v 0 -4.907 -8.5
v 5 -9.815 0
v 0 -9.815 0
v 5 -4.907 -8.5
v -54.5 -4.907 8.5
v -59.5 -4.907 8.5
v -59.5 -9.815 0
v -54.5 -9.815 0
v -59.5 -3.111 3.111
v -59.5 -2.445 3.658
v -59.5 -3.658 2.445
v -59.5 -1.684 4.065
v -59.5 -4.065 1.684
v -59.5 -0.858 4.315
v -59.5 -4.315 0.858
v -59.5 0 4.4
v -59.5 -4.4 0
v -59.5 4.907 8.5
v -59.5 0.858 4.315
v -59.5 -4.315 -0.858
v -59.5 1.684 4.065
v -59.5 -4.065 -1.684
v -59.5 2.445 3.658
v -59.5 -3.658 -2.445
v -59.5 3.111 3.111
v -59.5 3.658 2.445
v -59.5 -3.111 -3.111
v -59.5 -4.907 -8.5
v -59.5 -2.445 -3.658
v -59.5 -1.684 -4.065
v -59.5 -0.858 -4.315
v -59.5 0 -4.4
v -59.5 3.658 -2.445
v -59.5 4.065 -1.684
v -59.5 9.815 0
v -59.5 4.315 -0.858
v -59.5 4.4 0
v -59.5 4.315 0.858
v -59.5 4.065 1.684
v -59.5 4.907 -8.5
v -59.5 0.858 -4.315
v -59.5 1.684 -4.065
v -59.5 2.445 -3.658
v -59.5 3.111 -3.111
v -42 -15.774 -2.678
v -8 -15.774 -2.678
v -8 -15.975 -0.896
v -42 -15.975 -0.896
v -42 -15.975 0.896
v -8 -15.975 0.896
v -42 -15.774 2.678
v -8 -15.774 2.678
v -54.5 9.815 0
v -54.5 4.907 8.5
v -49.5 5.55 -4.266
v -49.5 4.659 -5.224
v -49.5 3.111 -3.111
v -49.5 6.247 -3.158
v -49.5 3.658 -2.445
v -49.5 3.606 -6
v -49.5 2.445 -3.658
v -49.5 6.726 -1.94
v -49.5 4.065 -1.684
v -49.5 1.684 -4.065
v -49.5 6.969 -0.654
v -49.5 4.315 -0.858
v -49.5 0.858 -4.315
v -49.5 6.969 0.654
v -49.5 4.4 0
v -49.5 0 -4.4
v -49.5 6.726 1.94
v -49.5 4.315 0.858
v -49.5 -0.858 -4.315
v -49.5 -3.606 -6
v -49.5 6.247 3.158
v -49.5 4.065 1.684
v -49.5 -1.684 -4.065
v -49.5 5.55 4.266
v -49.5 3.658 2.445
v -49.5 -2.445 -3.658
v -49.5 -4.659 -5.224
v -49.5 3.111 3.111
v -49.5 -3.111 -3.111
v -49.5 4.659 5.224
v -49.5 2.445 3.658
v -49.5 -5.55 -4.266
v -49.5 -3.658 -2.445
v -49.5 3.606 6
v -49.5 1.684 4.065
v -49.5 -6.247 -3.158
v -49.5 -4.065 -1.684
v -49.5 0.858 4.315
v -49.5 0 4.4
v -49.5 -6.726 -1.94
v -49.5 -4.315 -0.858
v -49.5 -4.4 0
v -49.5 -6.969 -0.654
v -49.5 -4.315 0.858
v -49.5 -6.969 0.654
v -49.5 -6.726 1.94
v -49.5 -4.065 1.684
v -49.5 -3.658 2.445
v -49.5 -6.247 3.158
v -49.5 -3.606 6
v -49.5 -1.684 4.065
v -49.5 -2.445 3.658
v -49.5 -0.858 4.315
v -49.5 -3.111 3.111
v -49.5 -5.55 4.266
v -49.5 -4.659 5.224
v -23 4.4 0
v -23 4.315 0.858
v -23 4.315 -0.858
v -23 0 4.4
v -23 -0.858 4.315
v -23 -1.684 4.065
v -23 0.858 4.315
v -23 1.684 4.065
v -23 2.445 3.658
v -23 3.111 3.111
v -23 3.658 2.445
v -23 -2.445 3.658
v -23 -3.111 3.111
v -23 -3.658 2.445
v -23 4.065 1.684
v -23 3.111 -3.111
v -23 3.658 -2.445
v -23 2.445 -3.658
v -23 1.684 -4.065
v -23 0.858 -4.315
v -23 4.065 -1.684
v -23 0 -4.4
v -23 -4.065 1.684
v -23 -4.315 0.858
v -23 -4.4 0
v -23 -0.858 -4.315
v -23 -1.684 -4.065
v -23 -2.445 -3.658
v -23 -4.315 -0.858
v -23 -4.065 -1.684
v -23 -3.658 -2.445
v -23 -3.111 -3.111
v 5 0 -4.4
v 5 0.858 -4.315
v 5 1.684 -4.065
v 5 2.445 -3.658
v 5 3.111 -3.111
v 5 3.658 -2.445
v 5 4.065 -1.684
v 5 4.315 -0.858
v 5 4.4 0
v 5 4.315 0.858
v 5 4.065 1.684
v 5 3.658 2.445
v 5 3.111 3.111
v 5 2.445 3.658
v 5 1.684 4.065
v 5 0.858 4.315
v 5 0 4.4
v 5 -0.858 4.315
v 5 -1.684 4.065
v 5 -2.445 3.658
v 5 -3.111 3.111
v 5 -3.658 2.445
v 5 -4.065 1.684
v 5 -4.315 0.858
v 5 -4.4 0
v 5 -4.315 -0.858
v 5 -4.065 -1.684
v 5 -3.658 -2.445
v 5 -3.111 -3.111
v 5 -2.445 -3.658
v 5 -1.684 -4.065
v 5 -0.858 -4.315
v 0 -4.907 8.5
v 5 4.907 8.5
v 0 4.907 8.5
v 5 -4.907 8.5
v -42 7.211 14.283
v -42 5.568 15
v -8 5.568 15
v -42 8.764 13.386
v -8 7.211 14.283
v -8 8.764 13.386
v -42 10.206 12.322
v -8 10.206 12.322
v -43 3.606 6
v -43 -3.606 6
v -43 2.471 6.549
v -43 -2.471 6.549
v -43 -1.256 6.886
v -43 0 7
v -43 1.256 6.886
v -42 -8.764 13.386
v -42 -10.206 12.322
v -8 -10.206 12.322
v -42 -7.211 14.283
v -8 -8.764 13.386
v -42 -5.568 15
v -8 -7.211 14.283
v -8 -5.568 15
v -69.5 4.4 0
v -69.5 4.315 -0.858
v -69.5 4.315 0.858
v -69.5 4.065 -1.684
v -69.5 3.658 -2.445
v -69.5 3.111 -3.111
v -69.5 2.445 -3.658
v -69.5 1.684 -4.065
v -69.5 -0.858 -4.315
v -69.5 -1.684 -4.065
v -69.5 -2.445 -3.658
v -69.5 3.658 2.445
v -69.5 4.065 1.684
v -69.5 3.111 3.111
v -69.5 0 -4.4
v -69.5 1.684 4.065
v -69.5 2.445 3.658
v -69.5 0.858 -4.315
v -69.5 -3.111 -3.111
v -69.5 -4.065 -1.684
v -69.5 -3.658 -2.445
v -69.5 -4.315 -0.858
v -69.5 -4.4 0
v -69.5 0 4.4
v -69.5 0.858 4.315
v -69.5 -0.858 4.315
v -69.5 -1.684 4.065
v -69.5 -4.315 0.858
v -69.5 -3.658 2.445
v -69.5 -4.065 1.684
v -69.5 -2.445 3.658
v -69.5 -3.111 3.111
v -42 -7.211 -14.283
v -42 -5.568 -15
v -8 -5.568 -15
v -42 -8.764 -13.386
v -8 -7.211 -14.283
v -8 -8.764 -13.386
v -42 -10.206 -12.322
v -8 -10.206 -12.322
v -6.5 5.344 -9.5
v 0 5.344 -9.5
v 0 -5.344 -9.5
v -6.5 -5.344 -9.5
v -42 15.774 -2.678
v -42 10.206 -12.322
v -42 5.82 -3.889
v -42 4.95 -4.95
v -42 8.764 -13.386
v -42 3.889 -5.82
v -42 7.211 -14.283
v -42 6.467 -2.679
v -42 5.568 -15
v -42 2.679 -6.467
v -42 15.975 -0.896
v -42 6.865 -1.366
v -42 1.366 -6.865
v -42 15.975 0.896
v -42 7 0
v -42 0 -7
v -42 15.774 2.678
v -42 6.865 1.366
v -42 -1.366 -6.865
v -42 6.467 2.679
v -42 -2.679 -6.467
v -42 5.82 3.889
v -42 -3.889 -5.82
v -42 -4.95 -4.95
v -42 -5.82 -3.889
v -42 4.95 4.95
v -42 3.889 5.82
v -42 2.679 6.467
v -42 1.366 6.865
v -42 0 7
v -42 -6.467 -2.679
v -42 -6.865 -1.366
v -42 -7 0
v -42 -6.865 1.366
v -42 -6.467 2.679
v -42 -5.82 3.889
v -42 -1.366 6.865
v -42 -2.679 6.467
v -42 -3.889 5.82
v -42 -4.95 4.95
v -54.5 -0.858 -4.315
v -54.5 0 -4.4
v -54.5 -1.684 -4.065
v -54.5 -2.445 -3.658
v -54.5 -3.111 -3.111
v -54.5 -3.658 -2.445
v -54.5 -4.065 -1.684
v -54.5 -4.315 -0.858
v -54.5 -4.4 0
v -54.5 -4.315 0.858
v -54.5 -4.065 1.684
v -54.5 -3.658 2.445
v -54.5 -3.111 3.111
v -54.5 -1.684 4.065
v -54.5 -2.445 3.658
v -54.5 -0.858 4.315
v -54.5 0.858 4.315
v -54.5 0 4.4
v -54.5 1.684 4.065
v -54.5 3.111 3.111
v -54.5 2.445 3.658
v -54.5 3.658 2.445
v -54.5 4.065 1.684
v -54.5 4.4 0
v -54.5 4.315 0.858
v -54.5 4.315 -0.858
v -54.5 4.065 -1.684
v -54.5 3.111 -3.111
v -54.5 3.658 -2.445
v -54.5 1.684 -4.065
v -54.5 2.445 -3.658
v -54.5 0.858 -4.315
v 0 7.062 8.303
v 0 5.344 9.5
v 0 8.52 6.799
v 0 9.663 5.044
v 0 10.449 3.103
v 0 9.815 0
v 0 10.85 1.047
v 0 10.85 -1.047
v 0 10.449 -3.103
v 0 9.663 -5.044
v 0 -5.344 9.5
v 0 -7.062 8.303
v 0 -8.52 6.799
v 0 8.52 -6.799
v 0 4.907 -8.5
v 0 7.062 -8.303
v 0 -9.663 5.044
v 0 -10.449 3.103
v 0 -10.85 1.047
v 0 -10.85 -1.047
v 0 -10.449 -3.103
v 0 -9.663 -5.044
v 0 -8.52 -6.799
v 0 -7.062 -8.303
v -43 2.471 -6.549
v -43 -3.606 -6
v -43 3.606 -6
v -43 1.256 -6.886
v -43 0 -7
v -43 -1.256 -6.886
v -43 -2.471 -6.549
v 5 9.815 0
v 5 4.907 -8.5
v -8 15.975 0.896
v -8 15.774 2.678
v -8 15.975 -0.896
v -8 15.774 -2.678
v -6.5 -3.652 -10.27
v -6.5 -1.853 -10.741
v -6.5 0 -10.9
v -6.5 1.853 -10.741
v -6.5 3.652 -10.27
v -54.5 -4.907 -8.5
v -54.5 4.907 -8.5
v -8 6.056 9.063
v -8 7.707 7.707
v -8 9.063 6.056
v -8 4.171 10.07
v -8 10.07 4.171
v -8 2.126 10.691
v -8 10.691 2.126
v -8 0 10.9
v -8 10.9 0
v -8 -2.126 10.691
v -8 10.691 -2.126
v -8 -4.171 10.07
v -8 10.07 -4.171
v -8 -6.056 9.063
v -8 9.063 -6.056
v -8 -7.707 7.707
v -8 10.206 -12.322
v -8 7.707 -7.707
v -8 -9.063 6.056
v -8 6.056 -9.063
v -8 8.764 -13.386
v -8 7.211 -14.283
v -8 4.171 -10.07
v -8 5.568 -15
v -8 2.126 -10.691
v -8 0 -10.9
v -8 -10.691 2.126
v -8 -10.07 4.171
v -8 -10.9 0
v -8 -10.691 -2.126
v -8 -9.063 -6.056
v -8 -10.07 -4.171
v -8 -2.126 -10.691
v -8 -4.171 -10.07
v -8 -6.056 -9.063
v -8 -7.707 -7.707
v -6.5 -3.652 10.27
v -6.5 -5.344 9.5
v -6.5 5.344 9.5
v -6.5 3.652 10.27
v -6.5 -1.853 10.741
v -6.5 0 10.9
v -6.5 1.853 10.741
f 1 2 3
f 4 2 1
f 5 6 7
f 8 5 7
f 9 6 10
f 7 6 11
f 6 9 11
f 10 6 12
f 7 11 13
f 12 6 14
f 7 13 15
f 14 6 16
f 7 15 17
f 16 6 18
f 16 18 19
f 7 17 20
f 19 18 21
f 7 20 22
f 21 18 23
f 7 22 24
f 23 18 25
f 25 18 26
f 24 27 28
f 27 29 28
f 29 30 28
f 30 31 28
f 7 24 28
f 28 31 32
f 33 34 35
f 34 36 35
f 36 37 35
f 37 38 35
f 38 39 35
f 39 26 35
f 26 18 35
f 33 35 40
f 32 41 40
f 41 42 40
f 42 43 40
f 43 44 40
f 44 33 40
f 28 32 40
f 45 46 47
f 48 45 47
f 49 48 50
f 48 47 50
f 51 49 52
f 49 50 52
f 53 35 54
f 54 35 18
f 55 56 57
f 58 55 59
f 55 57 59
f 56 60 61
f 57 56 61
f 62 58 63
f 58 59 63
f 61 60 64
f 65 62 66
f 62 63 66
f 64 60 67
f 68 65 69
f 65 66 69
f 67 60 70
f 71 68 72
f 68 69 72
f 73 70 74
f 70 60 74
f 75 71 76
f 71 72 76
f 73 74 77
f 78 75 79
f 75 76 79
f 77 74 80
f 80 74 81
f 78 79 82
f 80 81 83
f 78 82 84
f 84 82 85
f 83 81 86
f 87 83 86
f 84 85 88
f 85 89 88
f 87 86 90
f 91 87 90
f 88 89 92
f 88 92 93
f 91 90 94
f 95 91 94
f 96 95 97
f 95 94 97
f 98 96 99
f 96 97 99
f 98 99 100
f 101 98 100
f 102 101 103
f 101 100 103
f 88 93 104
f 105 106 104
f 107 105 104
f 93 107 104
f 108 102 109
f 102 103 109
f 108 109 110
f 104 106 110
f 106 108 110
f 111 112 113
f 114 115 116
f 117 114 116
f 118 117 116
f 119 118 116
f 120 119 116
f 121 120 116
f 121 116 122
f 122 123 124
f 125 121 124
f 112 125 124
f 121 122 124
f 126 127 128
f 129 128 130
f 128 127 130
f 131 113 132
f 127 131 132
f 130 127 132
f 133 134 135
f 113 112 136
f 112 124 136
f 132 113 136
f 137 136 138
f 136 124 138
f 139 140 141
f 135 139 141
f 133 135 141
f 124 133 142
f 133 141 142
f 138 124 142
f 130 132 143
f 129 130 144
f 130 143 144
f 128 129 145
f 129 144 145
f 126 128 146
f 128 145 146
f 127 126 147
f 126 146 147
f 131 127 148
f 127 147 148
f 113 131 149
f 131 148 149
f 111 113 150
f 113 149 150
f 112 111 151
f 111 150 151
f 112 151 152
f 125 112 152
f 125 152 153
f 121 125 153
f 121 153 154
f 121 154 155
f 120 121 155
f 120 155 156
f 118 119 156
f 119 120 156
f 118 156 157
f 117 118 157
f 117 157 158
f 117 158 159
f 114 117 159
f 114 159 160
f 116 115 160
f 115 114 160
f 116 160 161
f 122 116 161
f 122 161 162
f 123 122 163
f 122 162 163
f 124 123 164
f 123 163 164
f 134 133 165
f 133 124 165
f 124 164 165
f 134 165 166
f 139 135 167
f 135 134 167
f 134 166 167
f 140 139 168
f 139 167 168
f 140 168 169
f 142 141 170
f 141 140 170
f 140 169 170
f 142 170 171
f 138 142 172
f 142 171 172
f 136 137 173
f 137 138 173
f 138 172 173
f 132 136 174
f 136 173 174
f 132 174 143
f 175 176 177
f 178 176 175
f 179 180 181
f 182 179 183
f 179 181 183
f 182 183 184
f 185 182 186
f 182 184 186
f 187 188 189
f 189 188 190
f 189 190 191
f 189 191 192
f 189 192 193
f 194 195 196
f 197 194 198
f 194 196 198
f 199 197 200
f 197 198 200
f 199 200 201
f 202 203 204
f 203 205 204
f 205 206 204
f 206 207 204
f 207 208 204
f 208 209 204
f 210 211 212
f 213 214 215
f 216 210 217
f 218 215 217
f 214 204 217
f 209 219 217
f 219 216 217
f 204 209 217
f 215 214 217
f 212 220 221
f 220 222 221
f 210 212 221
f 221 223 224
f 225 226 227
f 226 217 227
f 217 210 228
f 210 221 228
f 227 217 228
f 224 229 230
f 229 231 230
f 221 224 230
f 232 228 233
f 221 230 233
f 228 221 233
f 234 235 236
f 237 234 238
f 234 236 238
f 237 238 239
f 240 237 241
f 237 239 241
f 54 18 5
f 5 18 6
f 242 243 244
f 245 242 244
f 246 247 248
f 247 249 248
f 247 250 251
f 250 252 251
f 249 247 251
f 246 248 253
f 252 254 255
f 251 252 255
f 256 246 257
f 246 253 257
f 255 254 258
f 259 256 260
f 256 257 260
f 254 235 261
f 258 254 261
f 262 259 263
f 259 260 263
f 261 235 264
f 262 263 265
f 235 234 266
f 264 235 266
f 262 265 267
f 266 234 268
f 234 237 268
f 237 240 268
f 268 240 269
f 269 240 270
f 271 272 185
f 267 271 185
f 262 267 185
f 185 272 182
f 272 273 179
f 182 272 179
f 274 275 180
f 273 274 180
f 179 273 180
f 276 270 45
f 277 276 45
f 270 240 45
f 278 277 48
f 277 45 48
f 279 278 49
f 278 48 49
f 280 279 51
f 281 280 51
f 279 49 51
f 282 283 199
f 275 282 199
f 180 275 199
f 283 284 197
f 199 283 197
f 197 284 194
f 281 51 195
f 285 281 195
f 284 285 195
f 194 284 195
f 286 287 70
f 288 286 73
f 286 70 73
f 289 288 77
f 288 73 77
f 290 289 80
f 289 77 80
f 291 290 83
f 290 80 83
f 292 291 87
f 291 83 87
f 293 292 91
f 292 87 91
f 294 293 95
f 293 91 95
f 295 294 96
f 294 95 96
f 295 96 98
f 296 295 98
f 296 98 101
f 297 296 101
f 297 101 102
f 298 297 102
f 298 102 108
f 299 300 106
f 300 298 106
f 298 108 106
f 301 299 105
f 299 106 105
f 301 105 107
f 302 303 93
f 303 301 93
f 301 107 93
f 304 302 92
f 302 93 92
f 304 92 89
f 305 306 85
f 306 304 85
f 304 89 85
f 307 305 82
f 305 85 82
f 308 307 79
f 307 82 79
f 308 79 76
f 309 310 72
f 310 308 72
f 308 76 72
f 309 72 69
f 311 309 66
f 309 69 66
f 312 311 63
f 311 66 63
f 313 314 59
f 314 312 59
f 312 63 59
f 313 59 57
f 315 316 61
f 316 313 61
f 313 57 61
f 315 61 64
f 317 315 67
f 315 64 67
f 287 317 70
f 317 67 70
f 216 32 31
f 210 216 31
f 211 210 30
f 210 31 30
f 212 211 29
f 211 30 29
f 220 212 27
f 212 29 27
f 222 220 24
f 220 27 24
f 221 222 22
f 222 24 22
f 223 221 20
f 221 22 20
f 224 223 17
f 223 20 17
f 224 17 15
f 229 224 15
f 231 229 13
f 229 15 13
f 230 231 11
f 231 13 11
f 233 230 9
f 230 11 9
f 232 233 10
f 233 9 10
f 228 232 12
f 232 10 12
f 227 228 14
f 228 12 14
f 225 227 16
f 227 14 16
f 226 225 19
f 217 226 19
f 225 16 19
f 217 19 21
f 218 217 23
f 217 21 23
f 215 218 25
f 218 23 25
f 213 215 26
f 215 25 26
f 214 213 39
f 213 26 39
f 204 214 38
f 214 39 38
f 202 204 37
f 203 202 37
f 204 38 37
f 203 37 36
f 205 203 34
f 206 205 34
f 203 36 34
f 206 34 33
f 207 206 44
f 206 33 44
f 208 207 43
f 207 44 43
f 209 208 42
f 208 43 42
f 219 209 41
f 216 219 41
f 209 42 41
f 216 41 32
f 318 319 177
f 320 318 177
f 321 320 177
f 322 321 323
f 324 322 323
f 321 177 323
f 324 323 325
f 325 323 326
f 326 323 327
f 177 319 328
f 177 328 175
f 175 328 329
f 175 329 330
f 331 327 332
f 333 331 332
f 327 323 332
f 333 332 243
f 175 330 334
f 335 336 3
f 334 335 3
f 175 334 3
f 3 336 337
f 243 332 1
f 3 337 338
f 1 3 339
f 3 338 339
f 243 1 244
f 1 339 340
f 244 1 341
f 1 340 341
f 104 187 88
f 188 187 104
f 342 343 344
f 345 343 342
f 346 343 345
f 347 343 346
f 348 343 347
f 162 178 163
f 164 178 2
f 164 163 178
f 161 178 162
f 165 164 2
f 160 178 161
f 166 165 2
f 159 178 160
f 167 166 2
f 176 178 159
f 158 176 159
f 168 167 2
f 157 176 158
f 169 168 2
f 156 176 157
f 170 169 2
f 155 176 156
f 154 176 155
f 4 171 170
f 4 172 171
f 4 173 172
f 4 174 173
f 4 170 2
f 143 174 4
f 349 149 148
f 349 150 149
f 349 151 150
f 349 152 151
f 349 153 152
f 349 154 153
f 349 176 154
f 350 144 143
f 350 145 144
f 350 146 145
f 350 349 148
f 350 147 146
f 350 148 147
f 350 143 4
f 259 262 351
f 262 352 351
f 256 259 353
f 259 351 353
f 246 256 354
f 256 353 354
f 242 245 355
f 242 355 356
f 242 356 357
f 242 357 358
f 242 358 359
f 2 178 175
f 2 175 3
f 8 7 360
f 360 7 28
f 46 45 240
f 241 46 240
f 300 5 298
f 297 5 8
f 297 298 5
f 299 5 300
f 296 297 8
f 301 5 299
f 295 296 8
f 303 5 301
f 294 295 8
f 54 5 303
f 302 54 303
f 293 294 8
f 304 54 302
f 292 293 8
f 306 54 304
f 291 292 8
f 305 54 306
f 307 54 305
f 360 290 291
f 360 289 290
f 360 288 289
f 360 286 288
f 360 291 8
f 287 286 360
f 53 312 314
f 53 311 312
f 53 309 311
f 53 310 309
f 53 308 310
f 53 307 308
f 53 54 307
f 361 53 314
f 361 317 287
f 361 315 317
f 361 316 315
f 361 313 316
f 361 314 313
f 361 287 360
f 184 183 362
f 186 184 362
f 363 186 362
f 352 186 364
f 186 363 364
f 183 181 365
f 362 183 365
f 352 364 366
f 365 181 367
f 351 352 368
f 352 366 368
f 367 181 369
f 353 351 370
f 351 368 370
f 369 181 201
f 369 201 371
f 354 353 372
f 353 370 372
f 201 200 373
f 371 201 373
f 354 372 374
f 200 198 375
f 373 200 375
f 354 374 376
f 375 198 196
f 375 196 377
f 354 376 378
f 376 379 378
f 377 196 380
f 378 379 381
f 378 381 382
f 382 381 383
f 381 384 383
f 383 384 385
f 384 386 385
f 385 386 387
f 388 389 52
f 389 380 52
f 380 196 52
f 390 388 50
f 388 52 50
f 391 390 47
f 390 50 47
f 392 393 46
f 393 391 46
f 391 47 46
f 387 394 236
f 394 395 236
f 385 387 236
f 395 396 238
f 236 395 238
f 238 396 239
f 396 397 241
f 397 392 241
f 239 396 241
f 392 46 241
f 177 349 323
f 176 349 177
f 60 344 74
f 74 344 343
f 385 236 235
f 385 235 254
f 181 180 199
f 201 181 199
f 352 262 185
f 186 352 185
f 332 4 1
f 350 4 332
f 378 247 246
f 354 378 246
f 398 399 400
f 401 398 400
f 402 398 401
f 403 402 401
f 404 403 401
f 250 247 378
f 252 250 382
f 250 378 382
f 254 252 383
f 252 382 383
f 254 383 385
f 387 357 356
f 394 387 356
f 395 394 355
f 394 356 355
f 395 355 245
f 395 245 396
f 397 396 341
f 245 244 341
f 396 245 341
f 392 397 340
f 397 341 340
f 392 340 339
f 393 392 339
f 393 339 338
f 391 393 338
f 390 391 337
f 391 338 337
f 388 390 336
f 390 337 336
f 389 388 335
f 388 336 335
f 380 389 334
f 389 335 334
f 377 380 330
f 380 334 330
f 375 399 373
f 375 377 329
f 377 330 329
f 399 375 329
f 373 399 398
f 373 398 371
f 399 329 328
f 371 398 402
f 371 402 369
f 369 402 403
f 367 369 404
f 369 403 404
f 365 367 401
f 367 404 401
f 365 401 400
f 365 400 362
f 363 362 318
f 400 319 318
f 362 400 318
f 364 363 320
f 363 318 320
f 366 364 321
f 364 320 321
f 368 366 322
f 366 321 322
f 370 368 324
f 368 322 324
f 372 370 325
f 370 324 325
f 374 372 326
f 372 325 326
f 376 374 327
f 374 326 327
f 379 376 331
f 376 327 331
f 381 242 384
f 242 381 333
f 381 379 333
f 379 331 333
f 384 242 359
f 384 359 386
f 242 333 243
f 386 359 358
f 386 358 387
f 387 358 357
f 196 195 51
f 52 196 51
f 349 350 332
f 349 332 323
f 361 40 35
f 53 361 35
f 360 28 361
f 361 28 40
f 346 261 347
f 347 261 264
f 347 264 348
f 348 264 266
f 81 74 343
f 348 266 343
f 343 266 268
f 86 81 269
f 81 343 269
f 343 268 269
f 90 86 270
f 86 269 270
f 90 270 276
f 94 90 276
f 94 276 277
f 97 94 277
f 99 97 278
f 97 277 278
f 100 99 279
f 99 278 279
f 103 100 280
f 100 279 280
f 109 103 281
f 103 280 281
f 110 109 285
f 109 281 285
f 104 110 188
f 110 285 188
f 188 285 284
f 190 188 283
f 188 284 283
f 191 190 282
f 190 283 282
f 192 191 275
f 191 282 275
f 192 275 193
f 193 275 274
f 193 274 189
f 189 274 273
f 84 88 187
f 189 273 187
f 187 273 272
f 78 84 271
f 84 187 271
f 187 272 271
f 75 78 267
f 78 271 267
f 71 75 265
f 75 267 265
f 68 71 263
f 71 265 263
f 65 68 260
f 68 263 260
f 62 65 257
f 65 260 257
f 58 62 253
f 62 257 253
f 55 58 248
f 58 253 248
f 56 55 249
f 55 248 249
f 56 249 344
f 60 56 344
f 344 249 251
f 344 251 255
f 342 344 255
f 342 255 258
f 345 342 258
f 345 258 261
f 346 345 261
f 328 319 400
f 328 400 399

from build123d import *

# Parameters (mm, degrees)
OUTSIDE_FLATSS_OUTSIDE_W = 50.588
OUTSIDE_FLATSS_OUTSIDE_H = 50.588
OUTSIDE_FLATS_DEPTH      = 74.090697082
FRONT_NUT_DEPTH          = 5
FRONT_START              = -6.5
FRONT_FLATS_DEPTH        = 6.5
REAR_FLATS_DEPTH         = 6.5
REAR_START               = 5
REAR_NUT_SK_R            = 4.4
REAR_NUT_DEPTH           = 5


with BuildPart() as part:
    # Bodies → Body (revolve)
    with BuildSketch(Plane.XY):
        Polygon((-69.5, 4.4), (-49.5, 4.4), (-49.5, 7), (-42, 7), (-42, 16), (-8, 16), (-8, 10.9), (0, 10.9), (0, 4.4), (-23, 4.4), (-23, 0), (-69.5, 0), align=None)
    revolve(axis=Axis((0, 0, 0), (-1, 0, 0)))

    # Outside Flatss outside → Outside Flats (cut, through all)
    with BuildSketch(Plane.ZY.offset(69.5)):
        Rectangle(OUTSIDE_FLATSS_OUTSIDE_W, OUTSIDE_FLATSS_OUTSIDE_H)
        Polygon((0, 17.320508076), (15, 8.660254038), (15, -8.660254038), (0, -17.320508076), (-15, -8.660254038), (-15, 8.660254038), align=None, mode=Mode.SUBTRACT)
    extrude(amount=-OUTSIDE_FLATS_DEPTH, mode=Mode.SUBTRACT)

    # Front Nuts → Front Nut (add)
    with BuildSketch(Plane.ZY.offset(59.5)):
        Polygon((0, 9.814954576), (8.5, 4.907477288), (8.5, -4.907477288), (0, -9.814954576), (-8.5, -4.907477288), (-8.5, 4.907477288), align=None)
    extrude(amount=-FRONT_NUT_DEPTH)

    # Front Flatss → Front Flats (cut)
    with BuildSketch(Plane.ZY.offset(49.5).offset(FRONT_START)):
        with BuildLine():
            Line((-6, 3.605551275), (-6, -3.605551275))
            ThreePointArc((-6, -3.605551275), (-7, 0), (-6, 3.605551275))
        make_face()
        with BuildLine():
            Line((6, 3.605551275), (6, -3.605551275))
            ThreePointArc((6, -3.605551275), (7, 0), (6, 3.605551275))
        make_face()
    extrude(amount=FRONT_FLATS_DEPTH, mode=Mode.SUBTRACT)

    # Rear Flatss → Rear Flats (cut)
    with BuildSketch(Plane(origin=(0, 0, 0), x_dir=(0, 0, -1), z_dir=(1, 0, 0))):
        with BuildLine():
            Line((-9.5, 5.344155686), (-9.5, -5.344155686))
            ThreePointArc((-9.5, -5.344155686), (-10.9, 0), (-9.5, 5.344155686))
        make_face()
        with BuildLine():
            Line((9.5, 5.344155686), (9.5, -5.344155686))
            ThreePointArc((9.5, -5.344155686), (10.9, 0), (9.5, 5.344155686))
        make_face()
    extrude(amount=-REAR_FLATS_DEPTH, mode=Mode.SUBTRACT)

    # Rear Nut sk → Rear Nut (add)
    with BuildSketch(Plane(origin=(0, 0, 0), x_dir=(0, 0, -1), z_dir=(1, 0, 0)).offset(REAR_START)):
        Polygon((8.5, 4.907477288), (0, 9.814954576), (-8.5, 4.907477288), (-8.5, -4.907477288), (0, -9.814954576), (8.5, -4.907477288), align=None)
        Circle(REAR_NUT_SK_R, mode=Mode.SUBTRACT)
    extrude(amount=-REAR_NUT_DEPTH)


solid = part.part
